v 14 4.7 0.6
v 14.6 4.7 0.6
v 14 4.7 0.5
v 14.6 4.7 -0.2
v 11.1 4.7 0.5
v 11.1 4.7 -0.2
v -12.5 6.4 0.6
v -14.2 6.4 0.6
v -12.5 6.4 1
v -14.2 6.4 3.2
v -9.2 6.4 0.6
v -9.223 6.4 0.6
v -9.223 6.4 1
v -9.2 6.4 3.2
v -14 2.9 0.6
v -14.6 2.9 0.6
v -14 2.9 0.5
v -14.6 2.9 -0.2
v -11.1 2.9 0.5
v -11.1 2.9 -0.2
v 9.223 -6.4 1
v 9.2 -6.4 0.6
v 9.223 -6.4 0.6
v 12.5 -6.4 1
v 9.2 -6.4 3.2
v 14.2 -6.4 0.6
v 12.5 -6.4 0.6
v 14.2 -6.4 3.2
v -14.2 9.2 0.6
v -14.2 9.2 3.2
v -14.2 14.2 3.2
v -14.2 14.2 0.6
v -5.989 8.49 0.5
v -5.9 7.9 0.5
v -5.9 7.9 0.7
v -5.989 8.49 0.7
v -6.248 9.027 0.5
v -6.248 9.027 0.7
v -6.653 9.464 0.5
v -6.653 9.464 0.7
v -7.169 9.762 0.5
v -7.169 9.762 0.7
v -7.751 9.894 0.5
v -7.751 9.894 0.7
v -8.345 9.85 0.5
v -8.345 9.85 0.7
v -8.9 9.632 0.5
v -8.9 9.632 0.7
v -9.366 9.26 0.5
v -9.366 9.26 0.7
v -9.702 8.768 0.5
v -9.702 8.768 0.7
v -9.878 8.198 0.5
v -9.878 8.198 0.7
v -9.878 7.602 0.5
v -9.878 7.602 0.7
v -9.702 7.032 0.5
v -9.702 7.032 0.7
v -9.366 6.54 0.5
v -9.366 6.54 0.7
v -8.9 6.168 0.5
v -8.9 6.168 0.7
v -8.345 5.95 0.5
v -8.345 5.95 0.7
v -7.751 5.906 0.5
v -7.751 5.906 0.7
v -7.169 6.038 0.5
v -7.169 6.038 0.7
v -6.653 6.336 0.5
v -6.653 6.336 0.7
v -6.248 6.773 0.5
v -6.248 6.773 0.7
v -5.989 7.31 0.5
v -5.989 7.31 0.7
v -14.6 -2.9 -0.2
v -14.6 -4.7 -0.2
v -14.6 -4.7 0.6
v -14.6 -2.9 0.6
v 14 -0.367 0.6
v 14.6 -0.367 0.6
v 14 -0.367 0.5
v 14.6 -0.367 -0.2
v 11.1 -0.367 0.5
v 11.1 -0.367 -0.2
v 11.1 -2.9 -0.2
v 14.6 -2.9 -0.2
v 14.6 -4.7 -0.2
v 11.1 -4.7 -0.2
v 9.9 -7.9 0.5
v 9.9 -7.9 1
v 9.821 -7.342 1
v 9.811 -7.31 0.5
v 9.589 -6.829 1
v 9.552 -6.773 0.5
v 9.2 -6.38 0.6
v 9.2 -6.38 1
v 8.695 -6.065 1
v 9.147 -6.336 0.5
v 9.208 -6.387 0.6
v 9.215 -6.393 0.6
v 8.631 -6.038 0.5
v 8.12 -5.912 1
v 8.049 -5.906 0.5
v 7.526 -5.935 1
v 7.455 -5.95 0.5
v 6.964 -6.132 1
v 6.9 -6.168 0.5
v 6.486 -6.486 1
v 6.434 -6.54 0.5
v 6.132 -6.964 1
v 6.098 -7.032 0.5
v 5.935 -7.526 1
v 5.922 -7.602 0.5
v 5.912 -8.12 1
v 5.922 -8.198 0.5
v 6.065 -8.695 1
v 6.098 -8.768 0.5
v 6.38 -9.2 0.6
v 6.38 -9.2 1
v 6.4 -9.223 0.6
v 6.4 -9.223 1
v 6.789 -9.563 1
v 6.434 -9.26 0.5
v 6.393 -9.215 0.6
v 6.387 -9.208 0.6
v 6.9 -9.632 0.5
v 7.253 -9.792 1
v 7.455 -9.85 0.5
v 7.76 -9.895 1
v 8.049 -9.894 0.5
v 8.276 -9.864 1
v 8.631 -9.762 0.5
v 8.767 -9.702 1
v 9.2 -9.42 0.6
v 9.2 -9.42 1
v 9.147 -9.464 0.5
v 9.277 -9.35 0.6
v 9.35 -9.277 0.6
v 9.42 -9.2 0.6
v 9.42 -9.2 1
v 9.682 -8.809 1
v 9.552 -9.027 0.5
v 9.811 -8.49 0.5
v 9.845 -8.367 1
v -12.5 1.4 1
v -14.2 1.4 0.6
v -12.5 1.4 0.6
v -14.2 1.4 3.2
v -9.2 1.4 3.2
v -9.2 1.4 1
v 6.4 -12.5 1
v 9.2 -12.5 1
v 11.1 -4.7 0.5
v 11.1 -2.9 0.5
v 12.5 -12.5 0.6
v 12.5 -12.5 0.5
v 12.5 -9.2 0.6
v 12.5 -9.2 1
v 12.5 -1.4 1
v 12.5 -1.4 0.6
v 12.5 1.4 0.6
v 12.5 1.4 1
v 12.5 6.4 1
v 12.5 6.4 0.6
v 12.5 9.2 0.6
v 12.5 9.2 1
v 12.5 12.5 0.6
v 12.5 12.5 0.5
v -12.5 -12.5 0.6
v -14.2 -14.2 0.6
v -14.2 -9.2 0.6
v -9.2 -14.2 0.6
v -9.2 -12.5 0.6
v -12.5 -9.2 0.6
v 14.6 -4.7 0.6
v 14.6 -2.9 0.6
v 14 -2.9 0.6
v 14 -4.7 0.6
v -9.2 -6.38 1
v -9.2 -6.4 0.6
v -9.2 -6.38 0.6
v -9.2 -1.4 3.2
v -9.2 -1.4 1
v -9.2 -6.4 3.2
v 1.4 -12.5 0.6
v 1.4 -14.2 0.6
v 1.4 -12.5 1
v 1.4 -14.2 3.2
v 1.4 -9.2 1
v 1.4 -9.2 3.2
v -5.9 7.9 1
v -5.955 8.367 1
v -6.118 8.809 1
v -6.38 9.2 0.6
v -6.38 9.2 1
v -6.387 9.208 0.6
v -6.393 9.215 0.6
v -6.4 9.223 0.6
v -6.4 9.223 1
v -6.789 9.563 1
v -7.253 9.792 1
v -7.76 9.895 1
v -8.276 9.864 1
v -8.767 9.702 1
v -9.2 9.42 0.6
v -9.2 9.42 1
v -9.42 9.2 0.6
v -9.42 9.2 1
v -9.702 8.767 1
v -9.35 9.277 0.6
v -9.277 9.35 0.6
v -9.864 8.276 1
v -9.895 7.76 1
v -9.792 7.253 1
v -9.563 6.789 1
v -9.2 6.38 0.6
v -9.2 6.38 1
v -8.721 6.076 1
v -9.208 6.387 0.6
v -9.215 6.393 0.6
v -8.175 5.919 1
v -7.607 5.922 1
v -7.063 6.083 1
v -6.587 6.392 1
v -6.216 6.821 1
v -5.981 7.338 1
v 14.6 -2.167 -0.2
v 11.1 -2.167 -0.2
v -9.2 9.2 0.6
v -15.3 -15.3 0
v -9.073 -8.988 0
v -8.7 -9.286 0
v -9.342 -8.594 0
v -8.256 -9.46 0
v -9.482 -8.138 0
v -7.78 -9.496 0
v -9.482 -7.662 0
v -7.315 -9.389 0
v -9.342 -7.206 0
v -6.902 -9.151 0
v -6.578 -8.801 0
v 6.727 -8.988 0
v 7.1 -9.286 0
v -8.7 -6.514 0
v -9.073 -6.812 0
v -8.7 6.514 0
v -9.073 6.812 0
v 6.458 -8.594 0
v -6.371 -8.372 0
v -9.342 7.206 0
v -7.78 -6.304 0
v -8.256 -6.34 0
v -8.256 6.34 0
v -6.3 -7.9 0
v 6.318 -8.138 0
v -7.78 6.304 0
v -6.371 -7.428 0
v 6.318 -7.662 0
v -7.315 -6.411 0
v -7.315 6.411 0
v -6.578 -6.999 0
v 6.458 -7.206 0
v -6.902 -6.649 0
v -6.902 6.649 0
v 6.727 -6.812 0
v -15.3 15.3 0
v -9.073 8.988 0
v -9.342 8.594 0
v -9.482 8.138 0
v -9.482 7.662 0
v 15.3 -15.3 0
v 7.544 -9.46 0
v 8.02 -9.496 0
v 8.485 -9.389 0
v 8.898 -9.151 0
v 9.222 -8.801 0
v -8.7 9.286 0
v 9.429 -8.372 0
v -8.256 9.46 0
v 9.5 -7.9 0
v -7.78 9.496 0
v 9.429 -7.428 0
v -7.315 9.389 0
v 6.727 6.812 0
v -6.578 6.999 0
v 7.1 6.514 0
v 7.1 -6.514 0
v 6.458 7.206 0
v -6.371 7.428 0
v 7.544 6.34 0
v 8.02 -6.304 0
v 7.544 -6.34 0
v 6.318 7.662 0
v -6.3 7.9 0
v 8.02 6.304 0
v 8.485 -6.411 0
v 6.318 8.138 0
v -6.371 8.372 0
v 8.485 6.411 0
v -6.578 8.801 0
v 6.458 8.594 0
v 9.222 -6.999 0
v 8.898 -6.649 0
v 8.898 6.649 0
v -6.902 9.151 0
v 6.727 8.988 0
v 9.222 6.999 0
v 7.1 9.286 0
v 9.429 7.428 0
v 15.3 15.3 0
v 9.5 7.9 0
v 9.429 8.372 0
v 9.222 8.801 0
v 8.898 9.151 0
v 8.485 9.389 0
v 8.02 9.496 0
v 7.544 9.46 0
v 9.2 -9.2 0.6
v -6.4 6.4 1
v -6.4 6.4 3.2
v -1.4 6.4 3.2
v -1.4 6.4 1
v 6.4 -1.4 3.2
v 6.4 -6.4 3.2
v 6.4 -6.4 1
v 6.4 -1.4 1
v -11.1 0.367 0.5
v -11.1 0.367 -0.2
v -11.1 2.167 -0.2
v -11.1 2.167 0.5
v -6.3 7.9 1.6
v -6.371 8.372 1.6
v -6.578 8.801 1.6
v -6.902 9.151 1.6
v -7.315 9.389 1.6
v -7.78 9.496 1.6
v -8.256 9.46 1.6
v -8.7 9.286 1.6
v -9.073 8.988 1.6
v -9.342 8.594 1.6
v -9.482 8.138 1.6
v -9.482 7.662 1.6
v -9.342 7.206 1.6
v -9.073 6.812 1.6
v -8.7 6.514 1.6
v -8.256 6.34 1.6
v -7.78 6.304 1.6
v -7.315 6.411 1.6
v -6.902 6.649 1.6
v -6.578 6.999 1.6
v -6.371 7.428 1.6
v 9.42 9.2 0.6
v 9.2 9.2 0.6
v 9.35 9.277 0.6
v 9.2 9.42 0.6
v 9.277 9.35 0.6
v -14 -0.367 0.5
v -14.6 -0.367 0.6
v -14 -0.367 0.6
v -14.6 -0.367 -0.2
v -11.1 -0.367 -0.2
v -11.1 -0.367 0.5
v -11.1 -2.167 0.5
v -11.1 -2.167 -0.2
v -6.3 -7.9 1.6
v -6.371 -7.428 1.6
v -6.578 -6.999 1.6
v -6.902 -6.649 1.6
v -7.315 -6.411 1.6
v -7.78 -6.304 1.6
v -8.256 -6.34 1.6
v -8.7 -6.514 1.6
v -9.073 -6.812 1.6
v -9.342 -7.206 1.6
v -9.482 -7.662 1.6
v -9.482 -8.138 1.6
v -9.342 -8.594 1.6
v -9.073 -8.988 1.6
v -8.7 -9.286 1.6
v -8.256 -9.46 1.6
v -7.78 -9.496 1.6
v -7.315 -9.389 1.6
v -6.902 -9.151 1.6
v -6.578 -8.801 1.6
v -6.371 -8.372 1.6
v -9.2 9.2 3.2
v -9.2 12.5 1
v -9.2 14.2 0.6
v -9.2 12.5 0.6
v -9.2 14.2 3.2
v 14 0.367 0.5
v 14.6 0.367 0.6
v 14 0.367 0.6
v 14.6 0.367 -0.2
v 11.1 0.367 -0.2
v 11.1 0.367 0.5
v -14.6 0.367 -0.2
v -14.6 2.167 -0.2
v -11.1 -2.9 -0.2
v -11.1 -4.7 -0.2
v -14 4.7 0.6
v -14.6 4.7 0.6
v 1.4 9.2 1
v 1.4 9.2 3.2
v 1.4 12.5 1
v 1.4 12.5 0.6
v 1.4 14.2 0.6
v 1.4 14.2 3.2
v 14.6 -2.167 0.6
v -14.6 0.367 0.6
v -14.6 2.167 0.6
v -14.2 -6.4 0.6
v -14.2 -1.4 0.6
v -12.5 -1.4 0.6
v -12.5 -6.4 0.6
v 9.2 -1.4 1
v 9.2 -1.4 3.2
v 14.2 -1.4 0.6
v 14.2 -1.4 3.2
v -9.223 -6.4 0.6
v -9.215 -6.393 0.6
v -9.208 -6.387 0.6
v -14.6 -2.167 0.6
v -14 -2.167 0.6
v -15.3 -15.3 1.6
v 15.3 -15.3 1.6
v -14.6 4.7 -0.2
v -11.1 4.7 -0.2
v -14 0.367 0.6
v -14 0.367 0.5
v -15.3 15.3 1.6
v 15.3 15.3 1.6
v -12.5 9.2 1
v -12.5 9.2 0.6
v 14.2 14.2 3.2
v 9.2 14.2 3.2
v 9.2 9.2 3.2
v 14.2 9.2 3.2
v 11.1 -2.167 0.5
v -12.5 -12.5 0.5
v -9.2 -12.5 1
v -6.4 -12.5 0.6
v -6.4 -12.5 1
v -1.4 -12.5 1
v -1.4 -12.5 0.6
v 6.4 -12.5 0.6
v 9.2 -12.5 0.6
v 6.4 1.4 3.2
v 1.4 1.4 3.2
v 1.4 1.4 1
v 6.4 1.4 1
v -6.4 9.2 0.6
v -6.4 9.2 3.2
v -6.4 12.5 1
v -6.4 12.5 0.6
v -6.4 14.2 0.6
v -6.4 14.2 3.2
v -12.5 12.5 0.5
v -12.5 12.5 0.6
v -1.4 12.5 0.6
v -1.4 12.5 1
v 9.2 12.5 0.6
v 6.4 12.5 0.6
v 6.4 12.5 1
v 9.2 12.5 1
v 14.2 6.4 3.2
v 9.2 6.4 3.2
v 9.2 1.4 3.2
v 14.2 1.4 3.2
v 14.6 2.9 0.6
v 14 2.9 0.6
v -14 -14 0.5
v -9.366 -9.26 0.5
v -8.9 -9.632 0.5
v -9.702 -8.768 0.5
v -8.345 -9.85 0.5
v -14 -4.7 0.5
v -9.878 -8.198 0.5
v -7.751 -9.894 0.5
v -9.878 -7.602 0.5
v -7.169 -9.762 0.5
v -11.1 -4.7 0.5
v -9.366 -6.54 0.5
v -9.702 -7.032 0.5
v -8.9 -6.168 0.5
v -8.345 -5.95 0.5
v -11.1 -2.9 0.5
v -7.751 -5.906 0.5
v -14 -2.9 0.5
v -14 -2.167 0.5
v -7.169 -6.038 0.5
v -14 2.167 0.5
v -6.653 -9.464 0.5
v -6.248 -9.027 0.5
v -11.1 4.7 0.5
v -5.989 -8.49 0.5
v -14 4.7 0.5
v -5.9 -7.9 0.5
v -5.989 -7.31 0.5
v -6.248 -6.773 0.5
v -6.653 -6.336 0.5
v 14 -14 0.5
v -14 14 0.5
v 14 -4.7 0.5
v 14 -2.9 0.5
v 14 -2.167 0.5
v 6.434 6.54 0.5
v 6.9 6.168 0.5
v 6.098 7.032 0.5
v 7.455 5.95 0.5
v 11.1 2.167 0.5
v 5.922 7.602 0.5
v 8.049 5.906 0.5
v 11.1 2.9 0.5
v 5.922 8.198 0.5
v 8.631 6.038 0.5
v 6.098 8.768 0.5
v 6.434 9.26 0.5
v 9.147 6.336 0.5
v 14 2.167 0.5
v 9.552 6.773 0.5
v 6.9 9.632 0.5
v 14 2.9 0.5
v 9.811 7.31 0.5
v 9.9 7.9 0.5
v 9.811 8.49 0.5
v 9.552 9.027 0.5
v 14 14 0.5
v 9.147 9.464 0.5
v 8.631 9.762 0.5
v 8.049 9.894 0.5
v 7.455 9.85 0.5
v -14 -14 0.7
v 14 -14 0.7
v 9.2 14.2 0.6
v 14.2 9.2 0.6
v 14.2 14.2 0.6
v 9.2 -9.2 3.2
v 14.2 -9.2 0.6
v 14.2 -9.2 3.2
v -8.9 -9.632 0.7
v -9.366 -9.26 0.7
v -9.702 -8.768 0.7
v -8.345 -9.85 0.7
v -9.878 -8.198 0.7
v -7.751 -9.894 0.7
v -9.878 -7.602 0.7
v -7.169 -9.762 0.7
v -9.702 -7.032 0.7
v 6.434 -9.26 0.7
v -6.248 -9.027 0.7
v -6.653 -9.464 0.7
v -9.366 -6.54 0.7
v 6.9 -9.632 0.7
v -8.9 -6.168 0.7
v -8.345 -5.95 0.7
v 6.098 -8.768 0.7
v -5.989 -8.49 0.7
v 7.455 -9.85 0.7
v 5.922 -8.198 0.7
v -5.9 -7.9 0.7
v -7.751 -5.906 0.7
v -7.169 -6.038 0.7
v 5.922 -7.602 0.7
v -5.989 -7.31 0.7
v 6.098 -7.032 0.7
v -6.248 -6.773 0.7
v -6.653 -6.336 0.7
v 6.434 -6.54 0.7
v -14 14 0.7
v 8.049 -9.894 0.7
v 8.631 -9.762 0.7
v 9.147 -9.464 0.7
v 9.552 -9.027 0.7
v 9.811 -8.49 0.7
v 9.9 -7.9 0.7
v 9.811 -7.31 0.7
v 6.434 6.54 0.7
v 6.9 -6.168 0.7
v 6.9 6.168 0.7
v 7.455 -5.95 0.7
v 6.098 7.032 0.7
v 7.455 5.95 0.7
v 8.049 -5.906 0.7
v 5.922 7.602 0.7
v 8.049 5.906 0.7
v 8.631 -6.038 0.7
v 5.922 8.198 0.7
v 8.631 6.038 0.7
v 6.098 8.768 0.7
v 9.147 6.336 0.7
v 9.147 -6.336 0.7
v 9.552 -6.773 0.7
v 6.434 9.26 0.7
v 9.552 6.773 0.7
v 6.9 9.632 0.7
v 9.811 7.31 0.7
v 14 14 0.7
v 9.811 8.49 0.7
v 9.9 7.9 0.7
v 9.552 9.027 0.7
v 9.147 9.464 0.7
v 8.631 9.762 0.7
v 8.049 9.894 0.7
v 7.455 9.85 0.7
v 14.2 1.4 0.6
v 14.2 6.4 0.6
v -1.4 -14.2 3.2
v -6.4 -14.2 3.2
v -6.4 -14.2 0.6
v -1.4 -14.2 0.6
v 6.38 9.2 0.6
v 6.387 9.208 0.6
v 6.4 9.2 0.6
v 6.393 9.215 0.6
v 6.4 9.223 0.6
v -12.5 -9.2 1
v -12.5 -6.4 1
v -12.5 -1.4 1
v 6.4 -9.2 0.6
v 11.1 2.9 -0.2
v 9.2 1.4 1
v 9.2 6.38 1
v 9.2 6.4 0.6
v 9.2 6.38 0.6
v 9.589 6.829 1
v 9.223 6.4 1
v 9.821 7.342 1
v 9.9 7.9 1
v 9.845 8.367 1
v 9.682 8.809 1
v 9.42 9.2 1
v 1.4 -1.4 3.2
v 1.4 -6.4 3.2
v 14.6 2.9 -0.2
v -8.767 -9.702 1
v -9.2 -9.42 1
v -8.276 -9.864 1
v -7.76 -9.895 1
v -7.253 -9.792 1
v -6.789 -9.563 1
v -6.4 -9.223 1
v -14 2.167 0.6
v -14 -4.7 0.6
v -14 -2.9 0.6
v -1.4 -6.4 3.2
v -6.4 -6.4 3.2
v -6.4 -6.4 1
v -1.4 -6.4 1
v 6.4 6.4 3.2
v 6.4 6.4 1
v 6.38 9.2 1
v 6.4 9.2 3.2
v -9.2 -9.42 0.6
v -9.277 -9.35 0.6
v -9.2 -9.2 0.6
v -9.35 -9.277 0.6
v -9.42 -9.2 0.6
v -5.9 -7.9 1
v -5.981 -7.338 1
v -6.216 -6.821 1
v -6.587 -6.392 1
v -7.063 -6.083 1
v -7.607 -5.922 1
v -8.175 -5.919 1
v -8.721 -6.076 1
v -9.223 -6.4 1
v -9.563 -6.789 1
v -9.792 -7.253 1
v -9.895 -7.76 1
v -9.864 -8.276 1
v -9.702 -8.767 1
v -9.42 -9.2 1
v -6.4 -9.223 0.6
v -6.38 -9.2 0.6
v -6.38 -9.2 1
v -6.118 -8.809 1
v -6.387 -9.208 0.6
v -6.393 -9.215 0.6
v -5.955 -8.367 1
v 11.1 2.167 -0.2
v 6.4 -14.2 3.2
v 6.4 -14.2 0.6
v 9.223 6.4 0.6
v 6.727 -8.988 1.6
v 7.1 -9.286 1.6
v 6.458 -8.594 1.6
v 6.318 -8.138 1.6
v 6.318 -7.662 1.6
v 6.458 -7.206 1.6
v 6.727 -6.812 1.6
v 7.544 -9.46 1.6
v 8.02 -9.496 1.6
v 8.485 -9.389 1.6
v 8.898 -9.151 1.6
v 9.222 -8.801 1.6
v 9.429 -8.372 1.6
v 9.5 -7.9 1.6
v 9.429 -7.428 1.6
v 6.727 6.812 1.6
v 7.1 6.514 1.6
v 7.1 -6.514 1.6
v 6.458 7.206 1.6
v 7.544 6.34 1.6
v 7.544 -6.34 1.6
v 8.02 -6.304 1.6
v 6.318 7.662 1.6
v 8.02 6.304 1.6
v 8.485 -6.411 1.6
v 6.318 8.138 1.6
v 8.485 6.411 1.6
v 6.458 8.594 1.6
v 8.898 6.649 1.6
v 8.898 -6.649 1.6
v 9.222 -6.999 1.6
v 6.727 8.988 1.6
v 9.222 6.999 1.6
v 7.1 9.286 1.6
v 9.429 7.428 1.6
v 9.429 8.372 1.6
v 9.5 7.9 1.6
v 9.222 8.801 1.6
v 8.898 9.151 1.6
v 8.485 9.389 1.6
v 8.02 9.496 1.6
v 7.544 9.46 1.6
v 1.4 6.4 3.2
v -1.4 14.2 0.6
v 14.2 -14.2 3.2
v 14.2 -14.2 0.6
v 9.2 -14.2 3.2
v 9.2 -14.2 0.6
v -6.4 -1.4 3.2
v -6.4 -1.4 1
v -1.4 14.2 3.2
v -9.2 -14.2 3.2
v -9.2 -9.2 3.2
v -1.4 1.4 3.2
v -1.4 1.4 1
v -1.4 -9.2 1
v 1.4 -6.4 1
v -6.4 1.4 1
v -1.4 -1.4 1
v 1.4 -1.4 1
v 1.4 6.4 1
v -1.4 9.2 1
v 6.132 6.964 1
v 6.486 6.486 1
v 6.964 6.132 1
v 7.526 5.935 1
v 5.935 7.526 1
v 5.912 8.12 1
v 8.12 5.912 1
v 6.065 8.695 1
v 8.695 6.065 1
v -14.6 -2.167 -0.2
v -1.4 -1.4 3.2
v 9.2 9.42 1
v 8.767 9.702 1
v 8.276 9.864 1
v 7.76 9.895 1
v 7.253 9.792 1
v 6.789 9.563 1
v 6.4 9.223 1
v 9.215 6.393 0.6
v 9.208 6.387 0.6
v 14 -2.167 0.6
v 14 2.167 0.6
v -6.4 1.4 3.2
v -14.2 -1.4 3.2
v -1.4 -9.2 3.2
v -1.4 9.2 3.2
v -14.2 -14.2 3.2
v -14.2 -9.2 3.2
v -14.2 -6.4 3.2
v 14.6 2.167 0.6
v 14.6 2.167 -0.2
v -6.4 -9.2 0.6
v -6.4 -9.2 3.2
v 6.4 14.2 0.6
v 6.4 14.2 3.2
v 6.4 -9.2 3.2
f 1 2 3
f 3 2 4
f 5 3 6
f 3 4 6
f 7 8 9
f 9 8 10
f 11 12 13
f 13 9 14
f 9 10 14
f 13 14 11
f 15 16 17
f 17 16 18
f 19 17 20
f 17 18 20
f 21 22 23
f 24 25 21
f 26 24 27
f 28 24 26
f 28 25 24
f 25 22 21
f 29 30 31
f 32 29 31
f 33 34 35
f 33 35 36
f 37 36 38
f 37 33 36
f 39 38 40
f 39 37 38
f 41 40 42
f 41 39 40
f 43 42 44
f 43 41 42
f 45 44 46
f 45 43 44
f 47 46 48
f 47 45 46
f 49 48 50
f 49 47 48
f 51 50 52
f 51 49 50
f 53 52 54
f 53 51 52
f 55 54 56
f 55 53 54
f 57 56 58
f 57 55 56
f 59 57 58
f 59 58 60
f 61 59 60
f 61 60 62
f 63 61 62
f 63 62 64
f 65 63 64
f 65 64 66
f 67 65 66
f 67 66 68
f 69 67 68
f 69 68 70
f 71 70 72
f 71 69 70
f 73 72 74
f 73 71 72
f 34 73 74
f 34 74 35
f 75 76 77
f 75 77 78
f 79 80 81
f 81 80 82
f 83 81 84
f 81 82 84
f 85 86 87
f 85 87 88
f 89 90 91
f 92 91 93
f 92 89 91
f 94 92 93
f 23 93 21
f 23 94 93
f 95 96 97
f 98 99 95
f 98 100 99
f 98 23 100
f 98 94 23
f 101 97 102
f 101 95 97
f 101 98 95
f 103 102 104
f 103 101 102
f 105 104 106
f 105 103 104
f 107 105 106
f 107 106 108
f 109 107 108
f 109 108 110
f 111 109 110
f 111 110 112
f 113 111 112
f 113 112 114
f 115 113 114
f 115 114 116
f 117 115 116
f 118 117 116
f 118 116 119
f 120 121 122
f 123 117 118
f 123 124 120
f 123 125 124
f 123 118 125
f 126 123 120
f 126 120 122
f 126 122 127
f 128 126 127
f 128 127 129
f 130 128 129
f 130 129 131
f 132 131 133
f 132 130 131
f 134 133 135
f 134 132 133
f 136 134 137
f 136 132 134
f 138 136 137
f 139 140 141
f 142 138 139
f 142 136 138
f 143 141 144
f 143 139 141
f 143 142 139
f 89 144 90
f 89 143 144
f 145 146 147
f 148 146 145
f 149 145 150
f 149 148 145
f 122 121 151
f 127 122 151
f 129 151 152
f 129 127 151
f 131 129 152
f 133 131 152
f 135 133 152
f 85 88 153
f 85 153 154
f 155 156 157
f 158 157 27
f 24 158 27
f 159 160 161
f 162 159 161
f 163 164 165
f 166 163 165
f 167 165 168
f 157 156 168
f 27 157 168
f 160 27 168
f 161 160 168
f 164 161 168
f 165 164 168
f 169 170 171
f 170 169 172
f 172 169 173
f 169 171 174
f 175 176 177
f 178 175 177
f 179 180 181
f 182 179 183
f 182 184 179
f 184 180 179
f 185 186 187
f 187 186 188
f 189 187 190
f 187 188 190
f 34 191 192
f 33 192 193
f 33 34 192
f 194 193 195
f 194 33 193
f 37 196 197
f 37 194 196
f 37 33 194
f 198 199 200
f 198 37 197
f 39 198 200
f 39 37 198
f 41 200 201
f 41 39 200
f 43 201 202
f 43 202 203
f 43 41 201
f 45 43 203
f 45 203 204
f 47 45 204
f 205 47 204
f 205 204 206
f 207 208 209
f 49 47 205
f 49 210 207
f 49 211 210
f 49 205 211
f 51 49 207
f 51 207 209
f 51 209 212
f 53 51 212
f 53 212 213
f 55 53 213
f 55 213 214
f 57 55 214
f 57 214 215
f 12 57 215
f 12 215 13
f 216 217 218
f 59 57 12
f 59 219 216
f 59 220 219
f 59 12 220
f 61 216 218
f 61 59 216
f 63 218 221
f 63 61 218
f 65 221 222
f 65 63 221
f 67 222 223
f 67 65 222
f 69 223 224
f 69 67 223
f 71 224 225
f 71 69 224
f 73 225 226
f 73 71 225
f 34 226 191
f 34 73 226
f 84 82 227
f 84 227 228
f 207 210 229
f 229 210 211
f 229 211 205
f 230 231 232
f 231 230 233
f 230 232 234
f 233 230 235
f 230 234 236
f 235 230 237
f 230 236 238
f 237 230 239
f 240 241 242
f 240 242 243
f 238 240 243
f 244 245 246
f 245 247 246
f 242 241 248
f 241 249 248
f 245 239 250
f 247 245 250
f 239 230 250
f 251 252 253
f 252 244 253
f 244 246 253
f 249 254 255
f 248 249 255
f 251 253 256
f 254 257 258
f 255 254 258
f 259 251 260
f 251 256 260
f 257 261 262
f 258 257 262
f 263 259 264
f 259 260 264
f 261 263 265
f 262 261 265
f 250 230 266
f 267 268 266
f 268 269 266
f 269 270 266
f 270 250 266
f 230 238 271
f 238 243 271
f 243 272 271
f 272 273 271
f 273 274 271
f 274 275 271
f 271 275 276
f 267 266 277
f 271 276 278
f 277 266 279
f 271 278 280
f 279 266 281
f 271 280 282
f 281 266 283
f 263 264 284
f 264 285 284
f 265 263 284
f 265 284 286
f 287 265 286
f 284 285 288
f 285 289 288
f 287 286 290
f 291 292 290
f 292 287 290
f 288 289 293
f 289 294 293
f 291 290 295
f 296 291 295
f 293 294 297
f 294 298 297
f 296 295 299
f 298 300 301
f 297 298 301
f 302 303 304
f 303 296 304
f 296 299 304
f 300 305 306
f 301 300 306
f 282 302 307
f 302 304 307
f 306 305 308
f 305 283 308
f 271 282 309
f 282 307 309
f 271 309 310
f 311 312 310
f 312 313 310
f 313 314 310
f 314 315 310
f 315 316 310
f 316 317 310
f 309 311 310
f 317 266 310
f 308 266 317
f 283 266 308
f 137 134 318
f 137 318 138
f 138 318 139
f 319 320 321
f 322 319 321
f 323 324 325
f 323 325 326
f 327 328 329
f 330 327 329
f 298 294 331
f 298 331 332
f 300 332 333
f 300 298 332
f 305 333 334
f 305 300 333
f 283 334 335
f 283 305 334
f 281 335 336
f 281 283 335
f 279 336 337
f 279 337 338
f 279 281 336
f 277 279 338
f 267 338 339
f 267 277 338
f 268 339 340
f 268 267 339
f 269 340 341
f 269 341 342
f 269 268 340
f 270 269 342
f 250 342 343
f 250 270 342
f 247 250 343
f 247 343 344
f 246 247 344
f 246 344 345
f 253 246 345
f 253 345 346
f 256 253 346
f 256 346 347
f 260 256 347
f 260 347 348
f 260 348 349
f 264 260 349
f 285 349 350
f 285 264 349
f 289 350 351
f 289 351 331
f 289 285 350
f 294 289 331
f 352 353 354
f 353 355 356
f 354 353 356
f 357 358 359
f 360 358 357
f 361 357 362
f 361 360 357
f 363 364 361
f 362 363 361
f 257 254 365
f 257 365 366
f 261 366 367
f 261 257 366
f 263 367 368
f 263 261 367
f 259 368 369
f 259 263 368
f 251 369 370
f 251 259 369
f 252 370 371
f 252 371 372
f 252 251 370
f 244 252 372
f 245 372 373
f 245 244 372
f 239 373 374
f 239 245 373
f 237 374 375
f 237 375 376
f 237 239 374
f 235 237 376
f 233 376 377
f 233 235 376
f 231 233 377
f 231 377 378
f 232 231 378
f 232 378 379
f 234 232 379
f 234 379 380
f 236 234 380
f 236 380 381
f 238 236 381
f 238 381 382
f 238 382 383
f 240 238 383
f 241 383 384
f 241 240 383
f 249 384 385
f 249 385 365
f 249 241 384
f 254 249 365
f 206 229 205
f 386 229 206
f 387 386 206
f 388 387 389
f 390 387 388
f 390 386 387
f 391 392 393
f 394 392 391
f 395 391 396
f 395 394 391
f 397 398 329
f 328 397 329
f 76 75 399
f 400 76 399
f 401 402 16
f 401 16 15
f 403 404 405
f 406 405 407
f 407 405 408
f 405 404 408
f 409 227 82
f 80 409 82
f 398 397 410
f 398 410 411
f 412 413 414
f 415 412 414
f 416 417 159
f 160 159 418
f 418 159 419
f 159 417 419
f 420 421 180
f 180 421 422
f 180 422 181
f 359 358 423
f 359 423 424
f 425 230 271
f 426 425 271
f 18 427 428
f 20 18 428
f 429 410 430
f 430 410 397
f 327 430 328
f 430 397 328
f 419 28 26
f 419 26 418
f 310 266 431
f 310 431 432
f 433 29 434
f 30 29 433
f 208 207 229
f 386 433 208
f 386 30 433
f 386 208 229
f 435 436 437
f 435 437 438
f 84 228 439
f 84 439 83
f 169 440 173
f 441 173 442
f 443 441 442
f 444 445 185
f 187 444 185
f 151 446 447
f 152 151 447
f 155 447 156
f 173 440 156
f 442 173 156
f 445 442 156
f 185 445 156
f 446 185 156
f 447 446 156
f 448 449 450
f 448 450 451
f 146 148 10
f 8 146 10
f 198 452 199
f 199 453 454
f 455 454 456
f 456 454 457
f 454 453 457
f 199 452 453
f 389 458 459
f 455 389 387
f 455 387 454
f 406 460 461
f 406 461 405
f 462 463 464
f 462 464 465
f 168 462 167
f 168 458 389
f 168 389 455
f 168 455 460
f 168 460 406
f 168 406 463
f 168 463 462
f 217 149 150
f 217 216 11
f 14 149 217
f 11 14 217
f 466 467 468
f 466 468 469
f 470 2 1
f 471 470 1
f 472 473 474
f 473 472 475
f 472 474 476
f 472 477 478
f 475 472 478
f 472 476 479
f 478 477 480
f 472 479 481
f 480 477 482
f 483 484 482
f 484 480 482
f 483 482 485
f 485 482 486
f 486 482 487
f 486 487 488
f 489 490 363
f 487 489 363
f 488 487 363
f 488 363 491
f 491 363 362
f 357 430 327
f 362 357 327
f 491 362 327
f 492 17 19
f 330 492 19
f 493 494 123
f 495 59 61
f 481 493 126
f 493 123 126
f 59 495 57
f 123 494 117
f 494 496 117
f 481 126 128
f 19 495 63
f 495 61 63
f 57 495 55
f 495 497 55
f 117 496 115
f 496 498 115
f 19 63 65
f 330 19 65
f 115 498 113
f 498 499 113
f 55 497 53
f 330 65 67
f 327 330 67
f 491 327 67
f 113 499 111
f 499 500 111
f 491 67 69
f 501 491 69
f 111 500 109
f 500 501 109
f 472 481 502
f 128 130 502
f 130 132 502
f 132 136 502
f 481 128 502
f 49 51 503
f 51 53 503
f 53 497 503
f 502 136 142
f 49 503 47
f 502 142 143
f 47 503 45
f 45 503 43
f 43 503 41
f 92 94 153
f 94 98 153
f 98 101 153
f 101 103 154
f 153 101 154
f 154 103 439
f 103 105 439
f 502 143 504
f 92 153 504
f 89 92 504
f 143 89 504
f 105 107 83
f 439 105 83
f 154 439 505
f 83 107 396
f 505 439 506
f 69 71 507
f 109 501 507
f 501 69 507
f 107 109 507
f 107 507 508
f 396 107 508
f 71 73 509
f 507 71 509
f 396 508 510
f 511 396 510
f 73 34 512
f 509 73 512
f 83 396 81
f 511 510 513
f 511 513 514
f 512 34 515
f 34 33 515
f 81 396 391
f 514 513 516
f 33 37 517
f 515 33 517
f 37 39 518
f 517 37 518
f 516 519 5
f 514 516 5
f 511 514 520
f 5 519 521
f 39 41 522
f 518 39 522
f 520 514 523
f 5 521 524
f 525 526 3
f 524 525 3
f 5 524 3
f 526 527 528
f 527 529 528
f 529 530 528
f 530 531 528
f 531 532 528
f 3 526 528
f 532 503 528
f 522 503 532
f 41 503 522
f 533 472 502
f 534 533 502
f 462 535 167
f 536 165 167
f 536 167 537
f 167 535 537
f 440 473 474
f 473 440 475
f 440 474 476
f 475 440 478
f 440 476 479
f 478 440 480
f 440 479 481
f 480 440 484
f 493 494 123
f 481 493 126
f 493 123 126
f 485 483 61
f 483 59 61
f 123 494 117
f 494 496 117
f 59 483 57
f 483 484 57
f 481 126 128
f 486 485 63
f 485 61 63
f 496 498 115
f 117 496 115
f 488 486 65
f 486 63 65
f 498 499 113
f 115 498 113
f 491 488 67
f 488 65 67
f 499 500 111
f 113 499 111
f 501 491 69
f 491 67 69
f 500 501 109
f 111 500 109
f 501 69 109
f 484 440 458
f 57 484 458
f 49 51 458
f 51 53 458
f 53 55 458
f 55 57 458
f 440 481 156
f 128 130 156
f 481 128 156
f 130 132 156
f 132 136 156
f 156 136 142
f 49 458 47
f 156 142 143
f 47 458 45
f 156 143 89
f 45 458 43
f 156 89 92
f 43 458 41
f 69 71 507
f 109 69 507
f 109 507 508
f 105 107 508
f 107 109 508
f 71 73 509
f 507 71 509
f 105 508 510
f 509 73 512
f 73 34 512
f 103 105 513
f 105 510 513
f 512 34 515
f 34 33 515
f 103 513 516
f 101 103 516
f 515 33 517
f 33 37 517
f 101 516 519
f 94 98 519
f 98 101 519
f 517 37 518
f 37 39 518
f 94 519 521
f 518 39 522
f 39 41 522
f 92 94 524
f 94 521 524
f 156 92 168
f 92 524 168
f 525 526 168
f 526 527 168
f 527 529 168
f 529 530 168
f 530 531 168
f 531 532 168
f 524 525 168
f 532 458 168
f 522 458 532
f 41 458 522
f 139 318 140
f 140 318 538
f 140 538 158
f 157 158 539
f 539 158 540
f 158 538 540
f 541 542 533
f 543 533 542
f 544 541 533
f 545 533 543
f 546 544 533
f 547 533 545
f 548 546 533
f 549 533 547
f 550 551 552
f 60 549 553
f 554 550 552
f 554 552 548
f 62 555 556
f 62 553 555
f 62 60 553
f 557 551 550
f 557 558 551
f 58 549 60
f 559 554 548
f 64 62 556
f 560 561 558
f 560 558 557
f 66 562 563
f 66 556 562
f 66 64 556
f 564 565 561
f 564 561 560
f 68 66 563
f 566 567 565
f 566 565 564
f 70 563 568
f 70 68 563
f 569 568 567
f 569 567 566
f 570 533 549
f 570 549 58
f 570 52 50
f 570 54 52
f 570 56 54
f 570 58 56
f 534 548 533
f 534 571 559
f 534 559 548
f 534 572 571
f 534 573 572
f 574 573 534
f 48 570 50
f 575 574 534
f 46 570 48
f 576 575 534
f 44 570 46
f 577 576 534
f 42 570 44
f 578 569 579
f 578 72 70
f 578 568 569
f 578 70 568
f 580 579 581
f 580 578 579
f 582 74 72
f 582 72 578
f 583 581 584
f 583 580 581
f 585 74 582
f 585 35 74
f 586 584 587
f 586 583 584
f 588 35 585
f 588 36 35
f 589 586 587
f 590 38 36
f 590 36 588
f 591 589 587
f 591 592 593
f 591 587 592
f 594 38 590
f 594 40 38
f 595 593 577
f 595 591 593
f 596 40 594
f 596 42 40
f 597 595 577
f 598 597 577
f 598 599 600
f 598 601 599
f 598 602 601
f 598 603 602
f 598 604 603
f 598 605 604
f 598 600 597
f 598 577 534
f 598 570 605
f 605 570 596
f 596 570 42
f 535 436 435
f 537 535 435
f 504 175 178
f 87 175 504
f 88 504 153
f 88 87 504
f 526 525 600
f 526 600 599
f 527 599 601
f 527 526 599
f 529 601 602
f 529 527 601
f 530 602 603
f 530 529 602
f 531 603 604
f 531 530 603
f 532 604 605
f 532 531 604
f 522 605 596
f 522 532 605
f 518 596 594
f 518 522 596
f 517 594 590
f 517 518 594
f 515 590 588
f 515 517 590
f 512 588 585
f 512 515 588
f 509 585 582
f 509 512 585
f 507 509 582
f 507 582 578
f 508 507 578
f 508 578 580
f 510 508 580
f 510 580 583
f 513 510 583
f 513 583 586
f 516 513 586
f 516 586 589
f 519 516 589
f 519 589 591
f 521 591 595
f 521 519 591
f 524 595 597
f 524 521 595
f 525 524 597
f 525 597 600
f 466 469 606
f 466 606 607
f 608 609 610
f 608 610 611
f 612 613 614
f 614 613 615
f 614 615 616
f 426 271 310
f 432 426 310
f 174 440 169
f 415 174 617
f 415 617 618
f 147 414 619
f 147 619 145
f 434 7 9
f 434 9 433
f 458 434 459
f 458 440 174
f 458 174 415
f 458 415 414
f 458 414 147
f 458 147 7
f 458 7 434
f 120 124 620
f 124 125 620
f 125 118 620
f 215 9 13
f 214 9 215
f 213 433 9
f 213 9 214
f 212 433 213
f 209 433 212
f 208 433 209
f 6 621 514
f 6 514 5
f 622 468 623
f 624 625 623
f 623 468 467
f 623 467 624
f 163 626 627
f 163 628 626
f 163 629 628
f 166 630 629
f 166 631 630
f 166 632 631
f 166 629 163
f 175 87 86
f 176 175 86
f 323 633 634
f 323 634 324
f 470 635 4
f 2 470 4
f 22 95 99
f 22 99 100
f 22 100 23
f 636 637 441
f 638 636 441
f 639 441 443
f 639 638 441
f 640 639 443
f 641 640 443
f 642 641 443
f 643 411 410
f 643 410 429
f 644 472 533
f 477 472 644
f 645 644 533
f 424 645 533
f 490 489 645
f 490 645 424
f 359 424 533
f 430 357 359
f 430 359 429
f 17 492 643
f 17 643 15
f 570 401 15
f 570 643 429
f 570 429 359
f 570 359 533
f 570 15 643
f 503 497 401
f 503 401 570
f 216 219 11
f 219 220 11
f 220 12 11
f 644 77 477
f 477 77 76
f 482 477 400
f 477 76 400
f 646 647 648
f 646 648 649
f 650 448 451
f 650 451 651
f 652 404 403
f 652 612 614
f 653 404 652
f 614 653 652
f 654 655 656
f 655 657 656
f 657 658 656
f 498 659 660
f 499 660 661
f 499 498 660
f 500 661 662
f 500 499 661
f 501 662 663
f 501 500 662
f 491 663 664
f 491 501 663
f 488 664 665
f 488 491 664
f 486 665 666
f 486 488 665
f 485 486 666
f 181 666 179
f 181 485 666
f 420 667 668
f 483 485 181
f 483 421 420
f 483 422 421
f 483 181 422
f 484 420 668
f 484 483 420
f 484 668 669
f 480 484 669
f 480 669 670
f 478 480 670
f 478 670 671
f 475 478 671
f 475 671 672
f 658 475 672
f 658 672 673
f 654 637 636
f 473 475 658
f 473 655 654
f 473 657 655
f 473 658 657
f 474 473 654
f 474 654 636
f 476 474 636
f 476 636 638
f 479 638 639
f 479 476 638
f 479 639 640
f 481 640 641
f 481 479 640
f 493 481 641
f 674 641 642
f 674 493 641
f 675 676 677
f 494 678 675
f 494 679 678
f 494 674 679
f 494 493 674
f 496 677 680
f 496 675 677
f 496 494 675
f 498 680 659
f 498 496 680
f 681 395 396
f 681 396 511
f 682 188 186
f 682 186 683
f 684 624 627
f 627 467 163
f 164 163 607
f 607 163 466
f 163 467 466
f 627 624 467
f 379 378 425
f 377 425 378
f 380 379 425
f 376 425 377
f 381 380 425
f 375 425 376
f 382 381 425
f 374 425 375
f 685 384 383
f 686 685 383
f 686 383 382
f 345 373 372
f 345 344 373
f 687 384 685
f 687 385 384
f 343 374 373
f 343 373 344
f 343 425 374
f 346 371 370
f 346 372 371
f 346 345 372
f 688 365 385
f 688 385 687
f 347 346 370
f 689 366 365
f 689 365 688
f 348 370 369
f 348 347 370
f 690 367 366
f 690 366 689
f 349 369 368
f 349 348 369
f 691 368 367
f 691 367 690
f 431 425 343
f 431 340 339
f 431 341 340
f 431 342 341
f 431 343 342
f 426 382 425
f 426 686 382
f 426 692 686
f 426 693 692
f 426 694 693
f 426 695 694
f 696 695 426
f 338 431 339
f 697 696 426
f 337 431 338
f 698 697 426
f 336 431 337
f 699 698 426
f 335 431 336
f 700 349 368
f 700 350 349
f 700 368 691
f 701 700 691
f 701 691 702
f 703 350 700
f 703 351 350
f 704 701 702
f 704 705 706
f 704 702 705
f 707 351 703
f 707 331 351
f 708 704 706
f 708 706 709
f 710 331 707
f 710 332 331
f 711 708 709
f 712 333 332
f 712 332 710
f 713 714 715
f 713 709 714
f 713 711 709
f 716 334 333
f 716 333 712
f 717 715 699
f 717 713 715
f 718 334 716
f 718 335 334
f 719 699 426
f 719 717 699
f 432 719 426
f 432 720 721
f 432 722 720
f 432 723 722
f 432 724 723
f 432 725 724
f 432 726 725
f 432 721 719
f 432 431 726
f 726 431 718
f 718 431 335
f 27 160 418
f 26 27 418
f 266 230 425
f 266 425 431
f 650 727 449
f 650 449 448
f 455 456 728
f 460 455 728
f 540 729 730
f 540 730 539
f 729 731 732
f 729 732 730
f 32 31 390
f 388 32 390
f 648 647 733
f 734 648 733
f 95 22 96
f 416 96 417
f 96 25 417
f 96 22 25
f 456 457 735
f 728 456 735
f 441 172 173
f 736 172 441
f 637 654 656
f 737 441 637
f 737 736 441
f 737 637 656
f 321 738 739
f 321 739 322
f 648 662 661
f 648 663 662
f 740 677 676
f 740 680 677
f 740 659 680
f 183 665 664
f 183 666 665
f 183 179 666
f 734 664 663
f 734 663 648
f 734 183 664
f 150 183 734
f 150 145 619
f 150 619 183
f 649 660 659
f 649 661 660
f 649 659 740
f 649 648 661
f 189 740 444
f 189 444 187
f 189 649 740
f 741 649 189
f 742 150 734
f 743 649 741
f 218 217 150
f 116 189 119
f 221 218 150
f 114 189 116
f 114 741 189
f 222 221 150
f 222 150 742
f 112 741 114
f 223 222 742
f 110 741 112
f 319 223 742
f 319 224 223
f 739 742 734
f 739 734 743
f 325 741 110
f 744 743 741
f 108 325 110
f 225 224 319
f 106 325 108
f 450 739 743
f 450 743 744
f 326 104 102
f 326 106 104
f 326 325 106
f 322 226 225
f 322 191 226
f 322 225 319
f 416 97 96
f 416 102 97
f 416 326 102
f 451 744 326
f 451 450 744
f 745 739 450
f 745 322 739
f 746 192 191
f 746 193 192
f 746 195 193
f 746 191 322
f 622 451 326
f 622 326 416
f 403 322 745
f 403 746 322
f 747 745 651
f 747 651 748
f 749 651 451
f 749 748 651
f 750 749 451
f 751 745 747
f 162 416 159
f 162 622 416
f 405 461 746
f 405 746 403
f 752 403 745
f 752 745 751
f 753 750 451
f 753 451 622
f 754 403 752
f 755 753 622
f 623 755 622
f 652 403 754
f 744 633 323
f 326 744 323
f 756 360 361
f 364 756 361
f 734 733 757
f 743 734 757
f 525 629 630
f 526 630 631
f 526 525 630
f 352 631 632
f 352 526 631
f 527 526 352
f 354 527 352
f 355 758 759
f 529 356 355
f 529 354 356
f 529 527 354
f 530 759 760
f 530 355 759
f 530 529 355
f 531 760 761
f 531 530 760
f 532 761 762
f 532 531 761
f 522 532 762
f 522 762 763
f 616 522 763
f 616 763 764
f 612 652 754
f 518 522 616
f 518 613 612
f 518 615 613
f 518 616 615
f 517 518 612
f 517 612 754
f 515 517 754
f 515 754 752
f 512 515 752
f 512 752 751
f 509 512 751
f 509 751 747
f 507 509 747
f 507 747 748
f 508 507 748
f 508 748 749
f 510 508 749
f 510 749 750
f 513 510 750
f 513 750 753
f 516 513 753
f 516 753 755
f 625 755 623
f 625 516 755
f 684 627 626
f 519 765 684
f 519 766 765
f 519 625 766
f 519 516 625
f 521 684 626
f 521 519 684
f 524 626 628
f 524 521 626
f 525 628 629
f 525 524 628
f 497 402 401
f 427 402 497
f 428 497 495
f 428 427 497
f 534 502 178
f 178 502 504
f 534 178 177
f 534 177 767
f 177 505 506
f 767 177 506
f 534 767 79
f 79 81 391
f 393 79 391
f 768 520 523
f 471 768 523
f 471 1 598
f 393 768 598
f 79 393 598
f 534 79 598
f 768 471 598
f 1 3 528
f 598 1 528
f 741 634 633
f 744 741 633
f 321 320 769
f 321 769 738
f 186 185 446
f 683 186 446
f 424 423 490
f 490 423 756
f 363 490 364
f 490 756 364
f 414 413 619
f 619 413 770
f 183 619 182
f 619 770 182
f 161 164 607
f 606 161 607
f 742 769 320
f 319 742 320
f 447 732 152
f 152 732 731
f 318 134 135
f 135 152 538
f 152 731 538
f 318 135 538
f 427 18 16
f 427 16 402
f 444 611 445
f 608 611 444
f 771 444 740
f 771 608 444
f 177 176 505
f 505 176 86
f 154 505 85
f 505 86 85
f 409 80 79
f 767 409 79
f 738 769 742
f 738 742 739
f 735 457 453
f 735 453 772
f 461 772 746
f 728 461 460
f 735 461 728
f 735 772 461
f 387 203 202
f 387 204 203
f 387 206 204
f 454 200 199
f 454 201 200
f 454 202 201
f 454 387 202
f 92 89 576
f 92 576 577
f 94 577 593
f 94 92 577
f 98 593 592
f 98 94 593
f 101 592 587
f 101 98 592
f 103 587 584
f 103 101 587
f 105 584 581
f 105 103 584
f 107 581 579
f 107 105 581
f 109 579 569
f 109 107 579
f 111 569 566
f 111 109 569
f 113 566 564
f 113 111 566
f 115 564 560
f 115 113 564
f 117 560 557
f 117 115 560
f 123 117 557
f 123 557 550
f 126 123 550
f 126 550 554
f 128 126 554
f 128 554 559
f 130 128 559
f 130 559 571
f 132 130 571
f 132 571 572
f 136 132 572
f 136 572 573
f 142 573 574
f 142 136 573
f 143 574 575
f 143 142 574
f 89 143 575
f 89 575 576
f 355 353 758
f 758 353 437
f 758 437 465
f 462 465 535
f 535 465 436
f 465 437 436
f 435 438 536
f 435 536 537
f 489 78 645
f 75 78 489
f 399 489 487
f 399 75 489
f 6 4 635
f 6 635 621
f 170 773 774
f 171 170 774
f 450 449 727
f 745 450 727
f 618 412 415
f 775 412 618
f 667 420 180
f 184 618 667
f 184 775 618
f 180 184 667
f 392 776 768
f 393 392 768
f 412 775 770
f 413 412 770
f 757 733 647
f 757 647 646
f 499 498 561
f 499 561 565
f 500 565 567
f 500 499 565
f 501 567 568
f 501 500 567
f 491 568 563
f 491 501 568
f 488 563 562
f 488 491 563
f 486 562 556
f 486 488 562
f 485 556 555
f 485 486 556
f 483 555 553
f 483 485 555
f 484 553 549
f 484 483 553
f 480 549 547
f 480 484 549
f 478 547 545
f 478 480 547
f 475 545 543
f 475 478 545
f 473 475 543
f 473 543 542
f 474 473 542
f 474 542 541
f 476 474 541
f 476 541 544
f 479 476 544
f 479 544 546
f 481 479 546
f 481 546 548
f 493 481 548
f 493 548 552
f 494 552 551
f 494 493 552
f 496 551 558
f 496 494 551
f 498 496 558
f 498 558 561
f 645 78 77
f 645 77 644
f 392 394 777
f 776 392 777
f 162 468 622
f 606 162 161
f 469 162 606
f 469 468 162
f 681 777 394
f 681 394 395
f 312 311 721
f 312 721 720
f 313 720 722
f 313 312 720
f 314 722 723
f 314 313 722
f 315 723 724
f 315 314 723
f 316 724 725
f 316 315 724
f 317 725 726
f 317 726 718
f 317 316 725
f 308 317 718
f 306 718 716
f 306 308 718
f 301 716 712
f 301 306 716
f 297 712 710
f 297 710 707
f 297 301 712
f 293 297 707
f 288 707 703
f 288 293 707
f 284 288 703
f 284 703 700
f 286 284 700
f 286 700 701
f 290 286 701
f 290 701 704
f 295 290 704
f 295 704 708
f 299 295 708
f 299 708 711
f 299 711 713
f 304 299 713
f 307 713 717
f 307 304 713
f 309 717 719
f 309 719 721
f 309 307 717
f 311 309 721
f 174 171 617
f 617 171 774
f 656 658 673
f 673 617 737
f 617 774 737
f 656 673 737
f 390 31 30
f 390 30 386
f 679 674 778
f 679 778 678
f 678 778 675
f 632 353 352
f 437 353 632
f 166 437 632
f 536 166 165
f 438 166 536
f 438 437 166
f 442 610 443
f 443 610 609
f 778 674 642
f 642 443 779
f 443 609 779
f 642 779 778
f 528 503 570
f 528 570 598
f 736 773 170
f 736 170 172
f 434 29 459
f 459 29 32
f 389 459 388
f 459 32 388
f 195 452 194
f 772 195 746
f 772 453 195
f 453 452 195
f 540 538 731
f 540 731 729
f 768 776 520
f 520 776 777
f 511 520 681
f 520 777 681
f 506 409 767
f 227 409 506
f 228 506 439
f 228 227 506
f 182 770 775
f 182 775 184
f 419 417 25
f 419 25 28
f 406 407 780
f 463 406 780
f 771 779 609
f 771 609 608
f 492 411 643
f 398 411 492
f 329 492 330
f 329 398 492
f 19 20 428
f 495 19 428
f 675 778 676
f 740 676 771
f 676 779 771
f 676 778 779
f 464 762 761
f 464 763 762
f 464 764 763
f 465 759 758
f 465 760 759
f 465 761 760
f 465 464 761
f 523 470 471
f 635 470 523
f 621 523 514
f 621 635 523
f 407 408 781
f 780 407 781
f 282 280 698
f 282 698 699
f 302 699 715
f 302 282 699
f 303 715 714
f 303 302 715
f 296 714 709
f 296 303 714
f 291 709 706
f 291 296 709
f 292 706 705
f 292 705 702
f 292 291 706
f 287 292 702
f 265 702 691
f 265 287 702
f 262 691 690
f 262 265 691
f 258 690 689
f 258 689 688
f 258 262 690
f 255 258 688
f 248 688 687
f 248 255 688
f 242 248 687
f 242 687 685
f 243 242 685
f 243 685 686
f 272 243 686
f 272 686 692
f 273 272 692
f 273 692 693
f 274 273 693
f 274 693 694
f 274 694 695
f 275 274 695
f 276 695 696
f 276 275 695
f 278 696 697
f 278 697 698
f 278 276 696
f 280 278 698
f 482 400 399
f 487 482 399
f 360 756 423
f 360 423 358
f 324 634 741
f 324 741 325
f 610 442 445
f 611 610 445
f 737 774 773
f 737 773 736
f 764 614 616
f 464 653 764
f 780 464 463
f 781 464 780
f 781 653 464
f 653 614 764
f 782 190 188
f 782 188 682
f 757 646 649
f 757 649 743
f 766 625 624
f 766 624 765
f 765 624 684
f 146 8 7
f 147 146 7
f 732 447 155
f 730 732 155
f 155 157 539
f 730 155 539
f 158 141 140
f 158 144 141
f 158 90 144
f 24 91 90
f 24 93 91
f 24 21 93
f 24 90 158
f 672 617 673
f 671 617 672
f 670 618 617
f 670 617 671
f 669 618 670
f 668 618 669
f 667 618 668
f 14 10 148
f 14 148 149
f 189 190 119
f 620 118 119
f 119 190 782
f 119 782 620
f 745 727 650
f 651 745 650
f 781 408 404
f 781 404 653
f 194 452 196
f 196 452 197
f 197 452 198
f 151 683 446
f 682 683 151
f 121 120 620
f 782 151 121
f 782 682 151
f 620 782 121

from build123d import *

# Parameters (mm, degrees)
SKETCH_W                        = 30.6
SKETCH_H                        = 30.6
SKETCH_R                        = 1.6
PAD_DEPTH                       = 1.6
SKETCH004_W                     = 28
SKETCH004_H                     = 28
SKETCH004_R                     = 2
PAD004_DEPTH                    = 0.2
SKETCH005_W                     = 3.5
SKETCH005_H                     = 1.8
PAD005_DEPTH                    = 0.8
SKETCH005_LINEARPATTERN003_2_W  = 3.5
SKETCH005_LINEARPATTERN003_2_H  = 1.8
PAD005_LINEARPATTERN003_2_DEPTH = 0.8
SKETCH005_LINEARPATTERN003_3_W  = 3.5
SKETCH005_LINEARPATTERN003_3_H  = 1.8
PAD005_LINEARPATTERN003_3_DEPTH = 0.8
SKETCH005_LINEARPATTERN003_4_W  = 3.5
SKETCH005_LINEARPATTERN003_4_H  = 1.8
PAD005_LINEARPATTERN003_4_DEPTH = 0.8
SKETCH008_W                     = 25
SKETCH008_H                     = 25
SKETCH008_R                     = 2
PAD007_DEPTH                    = 0.5
SKETCH009_W                     = 5
SKETCH009_H                     = 5
PAD008_DEPTH                    = 2.6
SKETCH009_LINEARPATTERN008_2_W  = 5
SKETCH009_LINEARPATTERN008_2_H  = 5
PAD008_LINEARPATTERN008_2_DEPTH = 2.6
SKETCH009_LINEARPATTERN008_3_W  = 5
SKETCH009_LINEARPATTERN008_3_H  = 5
PAD008_LINEARPATTERN008_3_DEPTH = 2.6
SKETCH009_LINEARPATTERN008_4_W  = 5
SKETCH009_LINEARPATTERN008_4_H  = 5
PAD008_LINEARPATTERN008_4_DEPTH = 2.6
LINEARPATTERN007_COUNT          = 4
LINEARPATTERN007_PITCH          = 7.8


with BuildPart() as pcb:
    # Sketch → Pad (new body)
    with BuildSketch(Plane.XY):
        Rectangle(SKETCH_W, SKETCH_H)
        with Locations((-7.9, 7.9)):
            Circle(SKETCH_R, mode=Mode.SUBTRACT)
        with Locations((7.9, 7.9)):
            Circle(SKETCH_R, mode=Mode.SUBTRACT)
        with Locations((7.9, -7.9)):
            Circle(SKETCH_R, mode=Mode.SUBTRACT)
        with Locations((-7.9, -7.9)):
            Circle(SKETCH_R, mode=Mode.SUBTRACT)
    extrude(amount=PAD_DEPTH)


with BuildPart() as electrical:
    # Sketch004 → Pad004 (new body)
    with BuildSketch(Plane.XY.offset(0.5)):
        Rectangle(SKETCH004_W, SKETCH004_H)
        with Locations((-7.9, 7.9)):
            Circle(SKETCH004_R, mode=Mode.SUBTRACT)
        with Locations((7.9, 7.9)):
            Circle(SKETCH004_R, mode=Mode.SUBTRACT)
        with Locations((7.9, -7.9)):
            Circle(SKETCH004_R, mode=Mode.SUBTRACT)
        with Locations((-7.9, -7.9)):
            Circle(SKETCH004_R, mode=Mode.SUBTRACT)
    extrude(amount=PAD004_DEPTH)

    # Sketch005 → Pad005 (join)
    with BuildSketch(Plane.XY.offset(-0.2)):
        with Locations((-12.85, -3.8)):
            Rectangle(SKETCH005_W, SKETCH005_H)
    pad005 = extrude(amount=PAD005_DEPTH)

    # Sketch005 LinearPattern003 2 → Pad005 LinearPattern003 2 (add)
    with BuildSketch(Plane(origin=(0, 2.533333, -0.2), x_dir=(1, 0, 0), z_dir=(0, 0, 1))):
        with Locations((-12.85, -3.8)):
            Rectangle(SKETCH005_LINEARPATTERN003_2_W, SKETCH005_LINEARPATTERN003_2_H)
    pad005_linearpattern003_2 = extrude(amount=PAD005_LINEARPATTERN003_2_DEPTH)

    # Sketch005 LinearPattern003 3 → Pad005 LinearPattern003 3 (add)
    with BuildSketch(Plane(origin=(0, 5.066667, -0.2), x_dir=(1, 0, 0), z_dir=(0, 0, 1))):
        with Locations((-12.85, -3.8)):
            Rectangle(SKETCH005_LINEARPATTERN003_3_W, SKETCH005_LINEARPATTERN003_3_H)
    pad005_linearpattern003_3 = extrude(amount=PAD005_LINEARPATTERN003_3_DEPTH)

    # Sketch005 LinearPattern003 4 → Pad005 LinearPattern003 4 (add)
    with BuildSketch(Plane(origin=(0, 7.6, -0.2), x_dir=(1, 0, 0), z_dir=(0, 0, 1))):
        with Locations((-12.85, -3.8)):
            Rectangle(SKETCH005_LINEARPATTERN003_4_W, SKETCH005_LINEARPATTERN003_4_H)
    pad005_linearpattern003_4 = extrude(amount=PAD005_LINEARPATTERN003_4_DEPTH)

    # Mirrored001: Pad005, Pad005 LinearPattern003 2, Pad005 LinearPattern003 3, Pad005 LinearPattern003 4 across YZ
    add(pad005.mirror(Plane.YZ))
    add(pad005_linearpattern003_2.mirror(Plane.YZ))
    add(pad005_linearpattern003_3.mirror(Plane.YZ))
    add(pad005_linearpattern003_4.mirror(Plane.YZ))


with BuildPart() as leds:
    # Sketch008 → Pad007 (new body)
    with BuildSketch(Plane.XY.offset(0.5)):
        Rectangle(SKETCH008_W, SKETCH008_H)
        with Locations((-7.9, 7.9)):
            Circle(SKETCH008_R, mode=Mode.SUBTRACT)
        with Locations((7.9, 7.9)):
            Circle(SKETCH008_R, mode=Mode.SUBTRACT)
        with Locations((7.9, -7.9)):
            Circle(SKETCH008_R, mode=Mode.SUBTRACT)
        with Locations((-7.9, -7.9)):
            Circle(SKETCH008_R, mode=Mode.SUBTRACT)
    extrude(amount=PAD007_DEPTH)

    # Sketch009 → Pad008 (join)
    with BuildSketch(Plane.XY.offset(3.2)):
        with Locations((-11.7, -11.7)):
            Rectangle(SKETCH009_W, SKETCH009_H)
    pad008 = extrude(amount=-PAD008_DEPTH)

    # Sketch009 LinearPattern008 2 → Pad008 LinearPattern008 2 (add)
    with BuildSketch(Plane(origin=(7.8, 0, 3.2), x_dir=(1, 0, 0), z_dir=(0, 0, 1))):
        with Locations((-11.7, -11.7)):
            Rectangle(SKETCH009_LINEARPATTERN008_2_W, SKETCH009_LINEARPATTERN008_2_H)
    pad008_linearpattern008_2 = extrude(amount=-PAD008_LINEARPATTERN008_2_DEPTH)

    # Sketch009 LinearPattern008 3 → Pad008 LinearPattern008 3 (add)
    with BuildSketch(Plane(origin=(15.6, 0, 3.2), x_dir=(1, 0, 0), z_dir=(0, 0, 1))):
        with Locations((-11.7, -11.7)):
            Rectangle(SKETCH009_LINEARPATTERN008_3_W, SKETCH009_LINEARPATTERN008_3_H)
    pad008_linearpattern008_3 = extrude(amount=-PAD008_LINEARPATTERN008_3_DEPTH)

    # Sketch009 LinearPattern008 4 → Pad008 LinearPattern008 4 (add)
    with BuildSketch(Plane(origin=(23.4, 0, 3.2), x_dir=(1, 0, 0), z_dir=(0, 0, 1))):
        with Locations((-11.7, -11.7)):
            Rectangle(SKETCH009_LINEARPATTERN008_4_W, SKETCH009_LINEARPATTERN008_4_H)
    pad008_linearpattern008_4 = extrude(amount=-PAD008_LINEARPATTERN008_4_DEPTH)

    # LinearPattern007: Pad008, Pad008 LinearPattern008 2, Pad008 LinearPattern008 3, Pad008 LinearPattern008 4 ×4
    with Locations(*[(0, i * LINEARPATTERN007_PITCH, 0) for i in range(1, LINEARPATTERN007_COUNT)]):
        add(pad008)
        add(pad008_linearpattern008_2)
        add(pad008_linearpattern008_3)
        add(pad008_linearpattern008_4)


solid = Compound([pcb.part, electrical.part, leds.part])
